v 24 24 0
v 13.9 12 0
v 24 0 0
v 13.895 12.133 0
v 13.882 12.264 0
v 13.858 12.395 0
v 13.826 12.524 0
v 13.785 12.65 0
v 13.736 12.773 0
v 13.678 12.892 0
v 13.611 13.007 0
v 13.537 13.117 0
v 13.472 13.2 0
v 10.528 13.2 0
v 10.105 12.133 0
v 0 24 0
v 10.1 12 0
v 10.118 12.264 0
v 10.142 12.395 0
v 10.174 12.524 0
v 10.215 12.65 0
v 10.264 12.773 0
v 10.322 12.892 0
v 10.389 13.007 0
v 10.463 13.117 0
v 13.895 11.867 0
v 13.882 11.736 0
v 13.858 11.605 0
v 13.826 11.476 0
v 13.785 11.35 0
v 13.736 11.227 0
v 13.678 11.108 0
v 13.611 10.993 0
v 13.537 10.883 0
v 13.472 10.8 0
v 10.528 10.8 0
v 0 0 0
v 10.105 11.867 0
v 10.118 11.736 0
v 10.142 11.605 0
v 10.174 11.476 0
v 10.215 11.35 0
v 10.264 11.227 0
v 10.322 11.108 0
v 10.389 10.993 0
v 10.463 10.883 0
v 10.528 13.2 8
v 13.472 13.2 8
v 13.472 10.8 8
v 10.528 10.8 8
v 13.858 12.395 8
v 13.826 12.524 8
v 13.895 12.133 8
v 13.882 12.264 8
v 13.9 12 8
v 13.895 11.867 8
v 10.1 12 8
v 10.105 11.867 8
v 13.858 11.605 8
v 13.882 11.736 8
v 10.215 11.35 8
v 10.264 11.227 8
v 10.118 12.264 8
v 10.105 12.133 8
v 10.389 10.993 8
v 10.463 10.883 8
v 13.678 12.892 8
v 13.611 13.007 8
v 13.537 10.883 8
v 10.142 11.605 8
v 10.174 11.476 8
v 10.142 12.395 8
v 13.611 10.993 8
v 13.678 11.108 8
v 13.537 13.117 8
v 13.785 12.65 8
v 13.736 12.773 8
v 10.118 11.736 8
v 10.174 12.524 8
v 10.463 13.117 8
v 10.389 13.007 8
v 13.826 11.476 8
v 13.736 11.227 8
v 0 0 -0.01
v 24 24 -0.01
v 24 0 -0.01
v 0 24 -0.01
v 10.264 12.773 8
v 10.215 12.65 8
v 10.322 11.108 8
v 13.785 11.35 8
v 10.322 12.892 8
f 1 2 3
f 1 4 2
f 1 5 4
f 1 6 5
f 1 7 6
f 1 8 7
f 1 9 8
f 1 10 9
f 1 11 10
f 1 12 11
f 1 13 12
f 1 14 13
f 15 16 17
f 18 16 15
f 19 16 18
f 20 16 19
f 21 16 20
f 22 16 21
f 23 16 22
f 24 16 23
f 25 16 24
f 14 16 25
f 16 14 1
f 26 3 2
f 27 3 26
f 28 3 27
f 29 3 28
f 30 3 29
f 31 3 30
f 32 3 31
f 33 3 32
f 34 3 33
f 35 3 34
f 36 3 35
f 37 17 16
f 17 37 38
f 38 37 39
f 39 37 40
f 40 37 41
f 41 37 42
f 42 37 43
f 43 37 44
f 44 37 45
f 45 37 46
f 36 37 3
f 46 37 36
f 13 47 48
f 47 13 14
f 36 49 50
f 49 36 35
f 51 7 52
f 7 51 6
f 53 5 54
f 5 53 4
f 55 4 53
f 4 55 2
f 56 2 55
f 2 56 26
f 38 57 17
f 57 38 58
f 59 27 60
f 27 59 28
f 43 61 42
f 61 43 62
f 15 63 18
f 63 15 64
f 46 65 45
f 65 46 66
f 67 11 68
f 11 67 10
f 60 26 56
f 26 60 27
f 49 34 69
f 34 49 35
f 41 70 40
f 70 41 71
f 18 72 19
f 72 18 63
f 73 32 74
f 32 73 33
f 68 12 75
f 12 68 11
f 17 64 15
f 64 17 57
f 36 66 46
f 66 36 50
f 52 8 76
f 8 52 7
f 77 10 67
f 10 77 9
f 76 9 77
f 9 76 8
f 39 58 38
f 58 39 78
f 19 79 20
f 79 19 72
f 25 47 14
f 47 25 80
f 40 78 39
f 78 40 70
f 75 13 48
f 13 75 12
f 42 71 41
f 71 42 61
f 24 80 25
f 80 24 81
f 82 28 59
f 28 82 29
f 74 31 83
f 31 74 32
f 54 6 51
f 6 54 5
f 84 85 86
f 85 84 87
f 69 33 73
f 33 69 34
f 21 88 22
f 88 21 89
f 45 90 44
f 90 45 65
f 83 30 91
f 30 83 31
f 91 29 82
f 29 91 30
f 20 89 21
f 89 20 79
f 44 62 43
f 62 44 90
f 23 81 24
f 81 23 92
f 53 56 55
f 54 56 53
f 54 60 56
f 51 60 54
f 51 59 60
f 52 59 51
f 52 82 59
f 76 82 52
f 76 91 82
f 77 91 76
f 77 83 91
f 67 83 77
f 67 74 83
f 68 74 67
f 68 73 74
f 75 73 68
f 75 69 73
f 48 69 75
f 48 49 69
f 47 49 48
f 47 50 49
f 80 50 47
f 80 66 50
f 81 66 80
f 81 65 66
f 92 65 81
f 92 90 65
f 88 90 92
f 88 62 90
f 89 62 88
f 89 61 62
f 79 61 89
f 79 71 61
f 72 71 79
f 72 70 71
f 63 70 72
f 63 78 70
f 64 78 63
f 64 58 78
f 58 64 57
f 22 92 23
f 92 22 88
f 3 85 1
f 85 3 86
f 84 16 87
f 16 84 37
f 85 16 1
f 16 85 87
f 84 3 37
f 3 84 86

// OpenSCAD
// file: ../Base/PlacementOptions.scad
// Fischertechnik Box Foundation
// Placement Options

// Alignment
NoAlign = 0;
AlignLeft = 1;
AlignBottom = 2;
AlignCenter = 3;
AlignRight = 4;
AlignTop = 5;

// Element rotation degree steps
rotations = [0, -90, -180, -270];

// Rotation
NoRotation = 0;
Rotate0 = 0;
Rotate90 = 1;
Rotate180 = 2;
Rotate270 = 3;

// Docking (seen from above)
NoDock = -1;
DockLeft = 0;
DockTop = 1;
DockRight = 2;
DockCorner = 2;
DockBottom = 3;

// Web corners
LowerLeft = 0;
UpperLeft = 1;
UpperRight = 2;
LowerRight = 3;

// Web position relative to corner
LeftOfCorner = 0;
RightOfCorner = 1;

// Rails direction
Horizontal = true;
Vertical = false;
// file: ../Base/Boxes.scad
// Fischertechnik Box Foundation
// Pre-designed Boxes

use <Constants.scad>

include <PlacementOptions.scad>

box190Width = 190;
box190Depth = 130;
box130Width = 130;
box130Depth = 95;

// Values are from an original ec3 box
topBottomDifference = 1.5;
outerHeight = 40;
baseThickness = 1.8;
innerHeight = outerHeight - baseThickness;
stackExcess = 5.7;
radius = 3.5;
wallThickness = 1.5;
tolerance = 0.2;

boxWallThickness = wallThickness;
boxBaseThickness = baseThickness;
boxWebWidth = 3.0;

// getBoxWallThickness()
// Gets the wall thickness of a Fischertechnik Box
function getBoxWallThickness() = boxWallThickness;

// getBoxUsageHeight(height = 38.2)
// Gets the usable height of a Fischertechnik box
// height = Outer height of the box from the bottom to the upper edge.
function getBoxUsageHeight(height = outerHeight) = height - baseThickness - stackExcess;

// getBoxInnerHeight()
// Gets the inner height of a Fischertechnik box, including the stack excess
function getBoxInnerHeight() = innerHeight;

// getBoxBaseThickness()
// Gets the thickness of the Fischertechnik box base.
function getBoxBaseThickness() = boxBaseThickness;

// getBoxWebWidth()
// Gets the width of a box web
function getBoxWebWidth() = boxWebWidth;

// getBox190Space()
// Gets the usable inner space of a Box 190 as an x/y-list
function getBox190Space() = [
    box190Width - 2*getBoxWallThickness() - topBottomDifference, 
    box190Depth - 2*getBoxWallThickness() - topBottomDifference ];

// RoundedCornerPlate(width, depth, height, radius)
// Creates a body plate with rounded corners for a box. Used
// also to create the complete box with the hull module.
// width = Width of the plate
// depth = depth of the plate 
// height = thickness of the plate
// radius = radius of the rounded corner
module RoundedCornerPlate(width, depth, height, radius) {
    translate([radius, radius])
    hull() {
        w = width-2*radius;
        d = depth-2*radius;
        cube([w, d, height]);
        cylinder(height, r=radius, $fn=getFragments());
        translate([w, 0])
            cylinder(height, r=radius, $fn=getFragments());
        translate([w, d])
            cylinder(height, r=radius, $fn=getFragments());
        translate([0, d])
            cylinder(height, r=radius, $fn=getFragments());
    }
}

// BoxBase(width, depth)
// Creates an empty stackable Fischertechnik compatible box
// width = Outer width of the box (190, 130, ...)
// depth = Outer depth of the box (130, 95, ...)

module BoxBase(width, depth, height=outerHeight) {    
    thinPlate = 0.01;

    innerHeight = height - baseThickness;    
    
    module Body(tolerance=tolerance) {
        hull() {
            // Bottom with tolerance to fit into the original boxes when stacked
            translate([-wallThickness+tolerance, -wallThickness+tolerance, -baseThickness])
                RoundedCornerPlate(width-topBottomDifference-2*tolerance, depth-topBottomDifference-2*tolerance, thinPlate, radius);
            
            // Top
            translate([-wallThickness-topBottomDifference/2, -wallThickness-topBottomDifference/2, innerHeight-thinPlate])
                RoundedCornerPlate(width, depth, thinPlate, radius);
         }
    }

    module Cutoff() {
        hull() {
            coWidth = width - 2*wallThickness;
            coDepth = depth - 2*wallThickness;
            
            // Bottom
            RoundedCornerPlate(coWidth-topBottomDifference, coDepth-topBottomDifference, thinPlate, radius);

            // Top
            translate([-topBottomDifference/2, -topBottomDifference/2, innerHeight+thinPlate]) 
                RoundedCornerPlate(coWidth, coDepth, thinPlate, radius);
        }
    }
    
    difference() {        
        Body();
        Cutoff();
        stackOffset = innerHeight - stackExcess;
        translate([0, 0, stackOffset + baseThickness])
            Body(tolerance=0);
    }
}

// Creates the Fischertechnik empty box 130x190 mm and places it at position 0,0
// 190x130 are the outer sizes, the inner space is slightly smaller. Use getBox190Space() to get the inner sizes.
// The box is positioned that the usable inner space is at the 0,0,0 position.

module Box190() {
    BoxBase(box190Width, box190Depth);
}

// Gets the usable inner space of a Box 130 as an x/y-list
function getBox130Space() = [
    box130Width - 2*getBoxWallThickness() - topBottomDifference, 
    box130Depth - 2*getBoxWallThickness() - topBottomDifference ];

// Creates the Fischertechnik empty box 95x130 mm and places it at position 0,0
// 190x130 are the outer sizes, the inner space is slightly smaller. Use getBox190Space() to get the inner sizes.
// The box is positioned that the usable inner space is at the 0,0,0 position.

module Box130() {
    BoxBase(box130Width, box130Depth);
}

// Creates a web at the specified box walls
// corner 0 = LowerLeft, 1 = UpperLeft, 2 = UpperRight, 3 = LowerRight
// side 0 = LeftOfCorner, 1 = RightOfCorner
// distance = Distance in mm from the corner
// boxSpace = inner width and depth of the box (default: Box 190)
// webWidth = length of the web (default is 3 mms)
// webThickness = thickness of the web (default is 1 mm)
// height = Height of the web (standard is getBoxUsageHeight())
// sink = How much of the web is sunk into the wall

module BoxWeb(
    corner, 
    side, 
    distance, 
    boxSpace=getBox190Space(), 
    webWidth=getBoxWebWidth(), 
    webThickness=1.0, 
    height=getBoxUsageHeight(),
    sink = getBoxWallThickness()/2) {
    width = (corner % 2 == 0) ? 
            (side == LeftOfCorner ? webWidth : webThickness) :
            (side == LeftOfCorner ? webThickness : webWidth);

    depth = (corner % 2 == 0) ? 
            (side == RightOfCorner ? webWidth : webThickness) :
            (side == RightOfCorner ? webThickness : webWidth);
    
    xDiff = corner == LowerLeft ? 
                (side == LeftOfCorner ? -sink : distance) :
            (corner == UpperLeft ?                
                (side == LeftOfCorner ? distance : -sink) :
            (corner == UpperRight ?
                (side == LeftOfCorner ? boxSpace.x-webWidth+sink : boxSpace.x-distance-webThickness) :
                (side == LeftOfCorner ? boxSpace.x-distance-webThickness: boxSpace.x-webWidth+sink)));

    yDiff = corner == LowerLeft ? 
                (side == RightOfCorner ? -sink : distance) :
            (corner == UpperLeft ?
                (side == RightOfCorner ? boxSpace.y-distance-webThickness : boxSpace.y-webWidth+sink) :
            (corner == UpperRight ?
                (side == RightOfCorner ? boxSpace.y-webWidth+sink : boxSpace.y-distance-webThickness) :
                (side == RightOfCorner ? distance : -sink)));
    
    translate([xDiff, yDiff, -getExcess()])
        cube([width, depth, height + 2*getExcess()]);
}
// file: ../Base/Rotation.scad
// Fischertechnik Box Foundation
// Geometry Helpers Rotation

include <PlacementOptions.scad>

// getRotatedSpace(space, rotation=NoRotation)
// Rotates the space dependent on the specified rotation

function getRotatedSpace(space, rotation=NoRotation) = [
    (rotation == Rotate90 || rotation == Rotate270) ? space.y : space.x,
    (rotation == Rotate90 || rotation == Rotate270) ? space.x : space.y
];

// Rotates the given space around the fixed left lower corner
// space = the space the children needs as width/depth list [width,depth]
// rotation = 0 Rotate0 degrees, 1 Rotate90 degrees, 2 Rotate180 degrees, 3 Rotate270 degrees (equivalent to -90)

module RotateFix(space, rotation=NoRotation) {
    dy = (rotation == Rotate0 || rotation == Rotate270) ? 0 :
        (rotation == Rotate90) ? space.x :
        space.y;
    dx = (rotation < Rotate180) ? 0 :
        (rotation == Rotate180) ? space.x :
        space.y;
    
    translate([dx, dy, 0])
        rotate([0, 0, rotations[rotation]])
            children();
}
// file: ../Base/Alignment.scad
// Fischertechnik Box Foundation
// Geometry Helpers Alignment

include <PlacementOptions.scad>

// getAlignedX(elementWidth, spaceWidth, align=AlignRight, offset=0)
// Gets the aligned X offset of an element with the given
// width in the given space.
// elementWidth = The width of the element to positon
// spaceWidth = The space where the element should be aligned
// align = 0 AlignLeft, 1 AlignCenter, 2 AlignRight
// offset = an optional offset from the aligned position. When
// aligned left or centered, then positive values are in X direction.
// When aligned right then positive values are in negative X direction.

function getAlignedX(elementWidth, spaceWidth, align=AlignRight, offset=0) =
    (align == AlignLeft) ?
        offset :
        ((align == AlignCenter) ?
        (spaceWidth - elementWidth)/2 + offset :
        spaceWidth - offset - elementWidth);

// getAlignedY(elementDepth, spaceDepth, align=AlignTop, offset=0)
// Gets the aligned Y offset of an element with the given
// depth in the given space.
// elementDepth = The depth of the element to positon
// spaceDepth = The space where the element should be aligned
// align = 0 AlignBottom, 1 AlignCenter, 2 AlignTop
// offset = an optional offset from the aligned position. When
// aligned bottom or centered, then positive values are in Y direction.
// When aligned top then positive values are in negative Y direction.

function getAlignedY(elementDepth, spaceDepth, align=AlignTop, offset=0) =
    (align == AlignBottom) ?
        offset :
        ((align == AlignCenter) ?
        (spaceDepth - elementDepth)/2 + offset :
        spaceDepth - offset - elementDepth);
// file: ../Base/Constants.scad
// Fischertechnik Box Foundation
// Constants

// Constant values necessary for multiple elements

// Base constants
dividerThickness = 1.2;
excess = 0.01;
fragments = 90;
tolerance = 0.8;

// Gets the thickness of a divider 
function getDividerThickness() = dividerThickness;

// Gets the excess that is used to merge walls into each other
function getExcess() = excess;

// Gets amount of fragments of a cylinder
function getFragments() = fragments;

// Gets the inner tolerance of a frame to each side
function getTolerance() = tolerance;


// Fischertechnik specific constants
axisDiameter = 4;
axisBottomDiameter = axisDiameter + 1;
axisTolerance = 0.2;
axisLockingLength = 8;

// Gets axis diameter of Fischertechnik axis
function getAxisDiameter() = axisDiameter;

// Gets axis diameter tolerance (subtracted for element axis)
function getAxisTolerance() = axisTolerance;

// Gets the axis diameter for standing axis
function getStandAxisDiameter() = getAxisDiameter() - getAxisTolerance();

// Gets axis bottom diameter for thicker part at the bottom
function getAxisBottomDiameter() = axisBottomDiameter;

// Gets the lengthh of the locking part of a locking axis
function getAxisLockingLength() = axisLockingLength;

pinHeight = 2.5;
pinTolerance = 0.2;

// gets the height of a connecting pin
function getPinHeight() = pinHeight;

// gets the connecting pin height tolerance
function getPinTolerance() = pinTolerance;

standardEdgeDistance = 2.5;
standardWebDistance = 11.5;
standardCornerLength = 15;

// gets the standard distance to the wall of the box for dockable frames with webs
function getStandardEdgeDistance() = standardEdgeDistance;

// gets the standard distance of each web to the corner of the dockable frame
function getStandardWebDistance() = standardWebDistance;

// gets the standard length of the corner walls of a dockable frame
function getStandardCornerLength() = standardCornerLength;

tubeWallFactor = 0.8;

// gets the wall thickness of a tube.
function getTubeWallThickness() = tubeWallFactor * getDividerThickness();

smallPartsFrameHeight = 20;

// gets the frame height for docked small parts boxes.
function getSmallPartsFrameHeight() = smallPartsFrameHeight;

hubRingDiameter = 19.5;
hubRingLevelDiameter = 21;

// gets the diameter of a tube matching the inner ring of a wheel
function getHubRingDiameter() = hubRingDiameter;

// gets the diameter of a hub tube with a thicker diameter
function getHubRingLevelDiameter() = hubRingLevelDiameter;
// file: ../Base/Placement.scad
// Fischertechnik Box Foundation
// Geometry Helpers Placement

use <Constants.scad>
use <Alignment.scad>
use <Rotation.scad>
use <Boxes.scad>

include <PlacementOptions.scad>

// Place(x=0, y=0, elementSpace=[0,0], alignX=AlignLeft, alignY=AlignBottom, rotation=Rotate0, boxSpace=getBox190Space())
// Places the child at the specified position
// y = Y-Position. This is a relative position when an X aligment is specified.
// x = X-Position. This is a relative position when an Y aligment is specified.
// elementSpace = space of the element to be placed [x,y]
// alignX = -1=NoAlign, 0 AlignLeft, 1 AlignCenter, 3 AlignRight (elementSpace and boxSpace required!)
// alignY = -1=NoAlign, 2 AlignBottom, 1 AlignCenter, 4 AlignTop (elementSpace and boxSpace required!)
// rotation = 0 Rotate0 0 degrees, 1 Rotate90 90 degrees, 
// 2 Rotate180 180 degrees, 3 Rotate270 270 degrees (equivalent to -90)
// boxSpace = Inner space of the box where the placement occurs [x,y] - default is Box 190x130 inner space

module Place(x=0, y=0, elementSpace=[0,0], 
  alignX=AlignLeft, alignY=AlignBottom, 
  rotation=NoRotation, boxSpace=getBox190Space()) {

    module Position(x, y, space, rotation=Rotate0) {
        translate([x, y, 0])
            RotateFix(space, rotation)
                children();
    }

    space = getRotatedSpace(elementSpace, rotation);
    alignedX = getAlignedX(space.x, boxSpace.x, alignX, x);
    alignedY = getAlignedY(space.y, boxSpace.y, alignY, y);
    Position(alignedX, alignedY, elementSpace, rotation)
        children();
}

// Center(space=getBox130Space(), elementSpace=[0,0])
// space = Space where the children is centered. For cylinder use centered=true and no elementSpace.
// elementSpace = space of the element to be centered [x,y]

module Center(space=getBox190Space(), elementSpace=[0,0]) {
    Place(elementSpace=elementSpace, boxSpace=space, alignX=AlignCenter, alignY=AlignCenter)
        children();
}

// CenterHorizontal(width=0, y=0, offset=0, space=getBox130Space())
// width = Width of the element to be placed.
// y = Y position of the element
// offset = Offset from the center position (negative will be left of the center)
// space = Space where the element is placed

module CenterHorizontal(width=0, y=0, offset=0, space=getBox190Space()) {
    Place(x=offset, y=y, elementSpace=[width, 0], boxSpace=space, alignX=AlignCenter)
        children(0);
}

// CenterVertical(depth=0, x=0, offset=0, space=getBox130Space())
// depth = Depth of the element to be placed.
// x = X position of the element
// offset = Offset from the center position (negative will be down of the center)
// space = Space where the element is placed

module CenterVertical(depth=0, x=0, offset=0, space=getBox190Space()) {
    Place(x=x, y=offset, elementSpace=[0, depth], boxSpace=space, alignY=AlignCenter)
        children(0);
}

// getIsVertical(align)
// True if the specified alignment needs a vertical orientation for a divider (AlignRight, AlignLeft)

function getIsVertical(align) = (align == AlignRight || align == AlignLeft);

// getIsHorizontal(align)
// True if the specified alignment needs a horizontal orientation for a divider (AlignTop, AlignBottom)

function getIsHorizontal(align) = (align == AlignTop || align == AlignBottom);
// main file
// Fischertechnik Box Library
// Axis for Locking Worm
// 35072

use <../Base/Placement.scad>
use <../ModelBase/Simple.scad>

/* [Hidden] */
width = 24;
depth = 24;

// getAxisLockingWormSpace()
// Gets the space locking worm needs

function getAxisLockingWormSpace() = [width, depth];

// AxisLockingWorm()
// Standing locking axis for locking worm.

module AxisLockingWorm() {
    space = [width, depth];
    Space(space);
    Center(space)
        LockingAxis();
}

// Tests
color("lightgray")
AxisLockingWorm();
